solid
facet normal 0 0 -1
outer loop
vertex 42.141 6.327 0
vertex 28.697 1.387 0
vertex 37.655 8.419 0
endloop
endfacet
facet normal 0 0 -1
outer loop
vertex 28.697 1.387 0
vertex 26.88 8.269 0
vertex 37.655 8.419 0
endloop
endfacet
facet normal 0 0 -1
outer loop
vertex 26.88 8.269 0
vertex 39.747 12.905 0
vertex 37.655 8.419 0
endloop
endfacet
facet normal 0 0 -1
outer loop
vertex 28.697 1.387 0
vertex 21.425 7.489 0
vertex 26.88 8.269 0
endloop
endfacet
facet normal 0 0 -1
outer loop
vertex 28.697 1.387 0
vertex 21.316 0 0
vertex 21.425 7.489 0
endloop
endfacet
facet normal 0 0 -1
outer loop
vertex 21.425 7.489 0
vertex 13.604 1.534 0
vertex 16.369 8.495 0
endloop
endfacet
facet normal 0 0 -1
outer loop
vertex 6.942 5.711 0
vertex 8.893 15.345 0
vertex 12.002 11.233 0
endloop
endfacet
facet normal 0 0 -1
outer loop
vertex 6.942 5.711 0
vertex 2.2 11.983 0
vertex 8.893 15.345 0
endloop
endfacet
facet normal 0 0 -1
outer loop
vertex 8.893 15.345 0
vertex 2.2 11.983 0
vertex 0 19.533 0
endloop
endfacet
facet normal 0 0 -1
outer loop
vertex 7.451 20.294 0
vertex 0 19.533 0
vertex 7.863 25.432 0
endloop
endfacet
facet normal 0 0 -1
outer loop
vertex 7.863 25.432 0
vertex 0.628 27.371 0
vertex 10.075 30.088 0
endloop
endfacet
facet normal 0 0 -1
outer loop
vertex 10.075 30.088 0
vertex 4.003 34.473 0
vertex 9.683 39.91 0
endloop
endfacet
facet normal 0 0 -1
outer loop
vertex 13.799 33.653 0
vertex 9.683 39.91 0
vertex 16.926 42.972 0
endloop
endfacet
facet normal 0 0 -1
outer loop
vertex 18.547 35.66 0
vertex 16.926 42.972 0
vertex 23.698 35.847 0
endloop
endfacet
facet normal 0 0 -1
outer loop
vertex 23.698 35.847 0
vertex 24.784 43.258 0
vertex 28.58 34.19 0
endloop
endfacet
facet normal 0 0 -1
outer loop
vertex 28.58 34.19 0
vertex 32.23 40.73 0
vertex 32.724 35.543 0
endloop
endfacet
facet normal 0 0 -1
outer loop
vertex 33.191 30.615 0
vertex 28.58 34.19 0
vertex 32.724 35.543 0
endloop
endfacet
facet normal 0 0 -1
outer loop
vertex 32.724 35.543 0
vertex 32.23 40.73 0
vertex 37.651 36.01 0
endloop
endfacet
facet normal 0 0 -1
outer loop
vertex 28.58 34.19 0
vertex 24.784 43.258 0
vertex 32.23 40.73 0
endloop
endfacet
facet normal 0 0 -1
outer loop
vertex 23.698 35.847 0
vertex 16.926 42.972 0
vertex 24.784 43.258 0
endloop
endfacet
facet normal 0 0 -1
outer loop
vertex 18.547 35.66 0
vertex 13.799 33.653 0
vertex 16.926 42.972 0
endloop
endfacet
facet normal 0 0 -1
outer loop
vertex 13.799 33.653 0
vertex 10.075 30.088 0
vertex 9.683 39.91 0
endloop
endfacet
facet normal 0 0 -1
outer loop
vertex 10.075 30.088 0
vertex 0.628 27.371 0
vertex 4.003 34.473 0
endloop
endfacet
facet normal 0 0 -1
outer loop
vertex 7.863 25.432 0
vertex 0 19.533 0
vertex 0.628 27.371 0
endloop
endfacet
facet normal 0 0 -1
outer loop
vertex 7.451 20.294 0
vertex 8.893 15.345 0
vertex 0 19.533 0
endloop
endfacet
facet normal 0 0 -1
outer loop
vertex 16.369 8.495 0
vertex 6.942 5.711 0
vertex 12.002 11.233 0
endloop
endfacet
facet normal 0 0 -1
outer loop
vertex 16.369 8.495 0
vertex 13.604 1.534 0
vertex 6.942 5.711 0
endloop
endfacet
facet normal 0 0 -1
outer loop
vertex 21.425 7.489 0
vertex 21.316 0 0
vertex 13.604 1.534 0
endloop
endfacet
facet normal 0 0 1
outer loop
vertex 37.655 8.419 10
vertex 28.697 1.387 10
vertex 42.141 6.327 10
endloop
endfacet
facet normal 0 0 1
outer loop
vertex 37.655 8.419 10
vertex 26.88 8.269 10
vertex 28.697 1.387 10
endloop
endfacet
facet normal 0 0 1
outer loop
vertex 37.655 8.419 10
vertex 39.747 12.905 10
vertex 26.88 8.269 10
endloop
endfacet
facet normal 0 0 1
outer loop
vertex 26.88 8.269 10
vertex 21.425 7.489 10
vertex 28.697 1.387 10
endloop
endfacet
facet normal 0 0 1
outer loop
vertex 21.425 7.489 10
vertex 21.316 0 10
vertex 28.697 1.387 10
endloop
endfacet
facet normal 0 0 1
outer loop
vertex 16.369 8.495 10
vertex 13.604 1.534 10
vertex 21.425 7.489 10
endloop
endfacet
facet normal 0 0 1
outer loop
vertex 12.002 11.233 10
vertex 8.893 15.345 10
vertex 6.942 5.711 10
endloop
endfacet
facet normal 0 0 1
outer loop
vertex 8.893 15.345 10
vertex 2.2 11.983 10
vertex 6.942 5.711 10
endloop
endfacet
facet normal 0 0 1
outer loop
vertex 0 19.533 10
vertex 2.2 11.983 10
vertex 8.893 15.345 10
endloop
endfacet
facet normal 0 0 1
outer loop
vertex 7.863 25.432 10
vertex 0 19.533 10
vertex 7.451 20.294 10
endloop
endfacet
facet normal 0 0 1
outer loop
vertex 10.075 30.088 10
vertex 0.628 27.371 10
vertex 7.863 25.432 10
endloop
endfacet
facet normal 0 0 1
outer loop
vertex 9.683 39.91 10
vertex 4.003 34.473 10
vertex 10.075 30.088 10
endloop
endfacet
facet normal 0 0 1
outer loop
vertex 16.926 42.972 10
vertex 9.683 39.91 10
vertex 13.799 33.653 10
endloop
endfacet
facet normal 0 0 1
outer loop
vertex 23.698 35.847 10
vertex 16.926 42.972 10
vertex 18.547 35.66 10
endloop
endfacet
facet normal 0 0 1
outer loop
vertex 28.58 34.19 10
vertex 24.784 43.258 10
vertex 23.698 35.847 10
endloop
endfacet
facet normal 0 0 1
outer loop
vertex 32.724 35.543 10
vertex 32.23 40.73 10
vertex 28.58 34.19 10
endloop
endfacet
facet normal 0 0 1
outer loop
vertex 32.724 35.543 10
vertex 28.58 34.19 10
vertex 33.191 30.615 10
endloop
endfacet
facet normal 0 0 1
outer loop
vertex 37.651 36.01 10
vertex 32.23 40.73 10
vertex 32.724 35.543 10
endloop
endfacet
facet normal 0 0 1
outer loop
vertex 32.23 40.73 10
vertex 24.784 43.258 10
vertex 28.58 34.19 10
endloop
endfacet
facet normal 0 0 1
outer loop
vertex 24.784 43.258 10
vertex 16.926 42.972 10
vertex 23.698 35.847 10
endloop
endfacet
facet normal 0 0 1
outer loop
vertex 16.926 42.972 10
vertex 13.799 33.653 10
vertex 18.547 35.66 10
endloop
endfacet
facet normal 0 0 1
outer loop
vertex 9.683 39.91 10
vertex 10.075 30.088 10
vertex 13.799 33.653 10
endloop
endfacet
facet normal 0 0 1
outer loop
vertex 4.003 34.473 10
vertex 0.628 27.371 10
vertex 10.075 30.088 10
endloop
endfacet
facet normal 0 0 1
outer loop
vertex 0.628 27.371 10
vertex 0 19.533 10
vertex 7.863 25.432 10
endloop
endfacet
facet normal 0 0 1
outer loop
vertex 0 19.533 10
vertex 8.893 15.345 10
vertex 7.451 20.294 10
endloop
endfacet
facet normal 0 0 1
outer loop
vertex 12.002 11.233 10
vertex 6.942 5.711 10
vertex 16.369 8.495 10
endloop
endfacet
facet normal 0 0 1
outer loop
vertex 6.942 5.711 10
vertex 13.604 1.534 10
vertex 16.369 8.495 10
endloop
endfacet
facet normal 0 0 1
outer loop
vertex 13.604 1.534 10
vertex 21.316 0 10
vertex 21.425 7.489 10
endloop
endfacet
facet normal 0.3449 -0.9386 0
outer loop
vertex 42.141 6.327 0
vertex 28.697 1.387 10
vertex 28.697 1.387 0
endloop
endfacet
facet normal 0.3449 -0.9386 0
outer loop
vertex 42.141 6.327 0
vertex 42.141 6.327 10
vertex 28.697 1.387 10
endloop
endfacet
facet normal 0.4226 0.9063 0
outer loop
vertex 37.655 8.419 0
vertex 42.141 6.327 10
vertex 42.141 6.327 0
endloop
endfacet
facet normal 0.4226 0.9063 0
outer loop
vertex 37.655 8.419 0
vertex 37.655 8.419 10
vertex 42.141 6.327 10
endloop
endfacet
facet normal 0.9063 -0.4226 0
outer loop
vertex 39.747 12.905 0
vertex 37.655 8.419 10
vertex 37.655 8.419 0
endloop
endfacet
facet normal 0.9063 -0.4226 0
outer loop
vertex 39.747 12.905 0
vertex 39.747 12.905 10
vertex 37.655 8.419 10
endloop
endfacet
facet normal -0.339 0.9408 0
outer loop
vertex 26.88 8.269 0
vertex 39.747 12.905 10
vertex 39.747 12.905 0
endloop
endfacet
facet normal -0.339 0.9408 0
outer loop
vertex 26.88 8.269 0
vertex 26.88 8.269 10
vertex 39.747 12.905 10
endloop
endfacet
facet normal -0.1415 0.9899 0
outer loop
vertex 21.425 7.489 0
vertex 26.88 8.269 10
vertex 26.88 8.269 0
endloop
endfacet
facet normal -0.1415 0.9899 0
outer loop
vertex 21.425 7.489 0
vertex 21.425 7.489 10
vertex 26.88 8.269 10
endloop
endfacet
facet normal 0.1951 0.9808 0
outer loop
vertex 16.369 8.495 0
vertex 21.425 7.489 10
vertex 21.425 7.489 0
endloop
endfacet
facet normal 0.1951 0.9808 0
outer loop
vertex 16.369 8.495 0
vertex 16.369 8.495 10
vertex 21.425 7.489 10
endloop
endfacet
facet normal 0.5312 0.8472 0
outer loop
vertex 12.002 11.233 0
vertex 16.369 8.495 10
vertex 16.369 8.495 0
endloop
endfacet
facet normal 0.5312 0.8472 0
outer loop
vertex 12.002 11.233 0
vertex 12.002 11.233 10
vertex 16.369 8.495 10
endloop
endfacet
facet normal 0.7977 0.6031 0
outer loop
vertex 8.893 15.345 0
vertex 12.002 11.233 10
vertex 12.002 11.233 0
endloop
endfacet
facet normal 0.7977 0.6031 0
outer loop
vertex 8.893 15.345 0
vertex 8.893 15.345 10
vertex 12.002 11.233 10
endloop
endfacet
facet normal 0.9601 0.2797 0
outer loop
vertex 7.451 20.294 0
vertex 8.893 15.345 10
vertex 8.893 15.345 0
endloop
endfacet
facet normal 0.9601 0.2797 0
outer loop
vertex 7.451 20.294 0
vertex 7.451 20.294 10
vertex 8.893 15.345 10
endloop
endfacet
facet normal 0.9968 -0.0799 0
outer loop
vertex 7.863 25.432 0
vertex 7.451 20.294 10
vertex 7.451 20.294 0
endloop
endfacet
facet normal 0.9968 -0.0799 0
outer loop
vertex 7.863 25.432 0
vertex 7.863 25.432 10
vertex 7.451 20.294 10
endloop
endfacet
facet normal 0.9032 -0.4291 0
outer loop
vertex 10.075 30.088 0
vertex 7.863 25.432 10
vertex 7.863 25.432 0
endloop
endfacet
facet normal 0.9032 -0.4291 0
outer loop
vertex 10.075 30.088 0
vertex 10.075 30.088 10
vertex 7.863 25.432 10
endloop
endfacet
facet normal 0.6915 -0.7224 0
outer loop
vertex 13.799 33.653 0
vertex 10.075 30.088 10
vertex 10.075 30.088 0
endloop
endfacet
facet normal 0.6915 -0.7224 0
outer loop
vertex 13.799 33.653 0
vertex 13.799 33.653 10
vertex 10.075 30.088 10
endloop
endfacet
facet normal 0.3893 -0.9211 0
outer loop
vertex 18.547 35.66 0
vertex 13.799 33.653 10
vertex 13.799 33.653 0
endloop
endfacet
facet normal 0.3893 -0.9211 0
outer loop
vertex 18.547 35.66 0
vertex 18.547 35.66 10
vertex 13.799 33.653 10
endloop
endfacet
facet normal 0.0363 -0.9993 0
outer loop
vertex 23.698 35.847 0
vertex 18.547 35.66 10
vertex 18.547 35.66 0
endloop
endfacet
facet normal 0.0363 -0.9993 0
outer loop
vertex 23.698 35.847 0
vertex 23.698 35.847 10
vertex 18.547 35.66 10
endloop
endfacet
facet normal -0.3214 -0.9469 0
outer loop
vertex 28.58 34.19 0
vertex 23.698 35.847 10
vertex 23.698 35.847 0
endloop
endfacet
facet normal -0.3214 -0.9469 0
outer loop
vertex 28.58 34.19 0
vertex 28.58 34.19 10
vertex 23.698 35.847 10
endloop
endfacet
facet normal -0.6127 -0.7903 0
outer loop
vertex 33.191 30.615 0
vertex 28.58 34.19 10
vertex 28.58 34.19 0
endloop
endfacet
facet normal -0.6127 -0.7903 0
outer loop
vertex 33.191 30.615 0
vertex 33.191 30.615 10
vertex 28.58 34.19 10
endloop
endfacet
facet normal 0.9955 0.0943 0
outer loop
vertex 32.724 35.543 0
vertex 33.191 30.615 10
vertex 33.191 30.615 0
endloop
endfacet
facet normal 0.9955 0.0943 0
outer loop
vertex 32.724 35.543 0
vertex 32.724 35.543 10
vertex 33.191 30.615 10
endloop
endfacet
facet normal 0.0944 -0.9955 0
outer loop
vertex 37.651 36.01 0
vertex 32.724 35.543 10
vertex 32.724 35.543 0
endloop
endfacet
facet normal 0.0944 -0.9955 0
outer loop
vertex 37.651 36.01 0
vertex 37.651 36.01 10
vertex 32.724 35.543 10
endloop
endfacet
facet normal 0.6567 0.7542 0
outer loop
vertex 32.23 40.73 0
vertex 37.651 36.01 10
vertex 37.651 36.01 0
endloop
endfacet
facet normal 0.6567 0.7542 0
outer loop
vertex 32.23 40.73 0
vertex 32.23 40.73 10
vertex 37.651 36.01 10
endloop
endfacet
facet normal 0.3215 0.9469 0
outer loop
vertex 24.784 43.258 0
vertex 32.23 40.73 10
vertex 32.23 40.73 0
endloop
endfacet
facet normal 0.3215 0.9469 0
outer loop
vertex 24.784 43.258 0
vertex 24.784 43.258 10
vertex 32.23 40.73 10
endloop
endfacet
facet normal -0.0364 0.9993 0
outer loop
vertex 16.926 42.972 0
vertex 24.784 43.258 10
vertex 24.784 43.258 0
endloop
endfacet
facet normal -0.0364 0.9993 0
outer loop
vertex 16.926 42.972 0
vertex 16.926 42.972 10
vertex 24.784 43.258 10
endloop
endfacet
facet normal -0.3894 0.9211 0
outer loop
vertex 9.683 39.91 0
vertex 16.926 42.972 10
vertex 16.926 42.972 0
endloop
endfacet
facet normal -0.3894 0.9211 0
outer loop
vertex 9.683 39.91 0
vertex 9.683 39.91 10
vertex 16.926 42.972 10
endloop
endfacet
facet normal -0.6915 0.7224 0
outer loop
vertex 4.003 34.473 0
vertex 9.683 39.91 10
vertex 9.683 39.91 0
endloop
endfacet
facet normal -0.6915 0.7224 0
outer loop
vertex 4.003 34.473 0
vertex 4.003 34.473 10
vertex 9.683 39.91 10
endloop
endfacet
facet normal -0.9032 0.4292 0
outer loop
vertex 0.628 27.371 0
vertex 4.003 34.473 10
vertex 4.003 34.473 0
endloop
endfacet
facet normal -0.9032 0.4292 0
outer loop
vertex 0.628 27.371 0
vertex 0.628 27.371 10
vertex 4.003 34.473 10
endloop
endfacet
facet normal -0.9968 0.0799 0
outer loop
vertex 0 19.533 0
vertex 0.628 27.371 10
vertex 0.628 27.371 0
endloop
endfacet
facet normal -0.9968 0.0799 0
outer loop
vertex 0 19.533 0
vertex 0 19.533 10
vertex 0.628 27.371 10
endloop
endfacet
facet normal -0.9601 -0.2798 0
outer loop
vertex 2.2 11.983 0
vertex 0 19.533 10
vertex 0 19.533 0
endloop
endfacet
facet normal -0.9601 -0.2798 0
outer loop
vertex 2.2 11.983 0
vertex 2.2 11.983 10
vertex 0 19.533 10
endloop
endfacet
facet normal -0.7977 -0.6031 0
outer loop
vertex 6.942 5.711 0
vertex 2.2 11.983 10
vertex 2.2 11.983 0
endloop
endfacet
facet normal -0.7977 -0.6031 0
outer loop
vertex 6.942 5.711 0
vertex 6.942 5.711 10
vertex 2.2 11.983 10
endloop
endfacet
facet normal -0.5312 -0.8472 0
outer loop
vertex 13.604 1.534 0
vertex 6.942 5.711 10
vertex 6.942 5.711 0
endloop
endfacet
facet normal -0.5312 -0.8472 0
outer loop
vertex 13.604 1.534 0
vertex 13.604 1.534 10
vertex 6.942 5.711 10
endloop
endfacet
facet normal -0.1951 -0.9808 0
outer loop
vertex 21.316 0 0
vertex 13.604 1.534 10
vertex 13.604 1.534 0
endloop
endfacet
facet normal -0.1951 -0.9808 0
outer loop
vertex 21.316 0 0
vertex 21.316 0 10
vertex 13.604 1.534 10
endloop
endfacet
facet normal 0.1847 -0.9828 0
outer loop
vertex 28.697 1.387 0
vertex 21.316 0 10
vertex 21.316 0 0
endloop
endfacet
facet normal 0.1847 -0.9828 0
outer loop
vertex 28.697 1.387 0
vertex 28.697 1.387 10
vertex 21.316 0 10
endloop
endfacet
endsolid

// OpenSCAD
$fn = 32;

// ----------------------------------------------------------------------
// Eye lug: ring_tail, 10 mm thick
// ----------------------------------------------------------------------

// --- parameters (mm) ---
profile_height = 10;      // extrusion height
profile_points = 30;      // points of the closed outline

profile = [[32.724, 35.543], [37.651, 36.01], [32.23, 40.73], [24.784, 43.258], [16.926, 42.972], [9.683, 39.91], [4.003, 34.473], [0.628, 27.371], [0, 19.533], [2.2, 11.983], [6.942, 5.711], [13.604, 1.534], [21.316, 0], [28.697, 1.387], [42.141, 6.327], [37.655, 8.419], [39.747, 12.905], [26.88, 8.269], [21.425, 7.489], [16.369, 8.495], [12.002, 11.233], [8.893, 15.345], [7.451, 20.294], [7.863, 25.432], [10.075, 30.088], [13.799, 33.653], [18.547, 35.66], [23.698, 35.847], [28.58, 34.19], [33.191, 30.615]];  // single closed polygon, 30 points, counter clockwise

// --- the one profile operation ---
linear_extrude(height = profile_height) polygon(points = profile);
